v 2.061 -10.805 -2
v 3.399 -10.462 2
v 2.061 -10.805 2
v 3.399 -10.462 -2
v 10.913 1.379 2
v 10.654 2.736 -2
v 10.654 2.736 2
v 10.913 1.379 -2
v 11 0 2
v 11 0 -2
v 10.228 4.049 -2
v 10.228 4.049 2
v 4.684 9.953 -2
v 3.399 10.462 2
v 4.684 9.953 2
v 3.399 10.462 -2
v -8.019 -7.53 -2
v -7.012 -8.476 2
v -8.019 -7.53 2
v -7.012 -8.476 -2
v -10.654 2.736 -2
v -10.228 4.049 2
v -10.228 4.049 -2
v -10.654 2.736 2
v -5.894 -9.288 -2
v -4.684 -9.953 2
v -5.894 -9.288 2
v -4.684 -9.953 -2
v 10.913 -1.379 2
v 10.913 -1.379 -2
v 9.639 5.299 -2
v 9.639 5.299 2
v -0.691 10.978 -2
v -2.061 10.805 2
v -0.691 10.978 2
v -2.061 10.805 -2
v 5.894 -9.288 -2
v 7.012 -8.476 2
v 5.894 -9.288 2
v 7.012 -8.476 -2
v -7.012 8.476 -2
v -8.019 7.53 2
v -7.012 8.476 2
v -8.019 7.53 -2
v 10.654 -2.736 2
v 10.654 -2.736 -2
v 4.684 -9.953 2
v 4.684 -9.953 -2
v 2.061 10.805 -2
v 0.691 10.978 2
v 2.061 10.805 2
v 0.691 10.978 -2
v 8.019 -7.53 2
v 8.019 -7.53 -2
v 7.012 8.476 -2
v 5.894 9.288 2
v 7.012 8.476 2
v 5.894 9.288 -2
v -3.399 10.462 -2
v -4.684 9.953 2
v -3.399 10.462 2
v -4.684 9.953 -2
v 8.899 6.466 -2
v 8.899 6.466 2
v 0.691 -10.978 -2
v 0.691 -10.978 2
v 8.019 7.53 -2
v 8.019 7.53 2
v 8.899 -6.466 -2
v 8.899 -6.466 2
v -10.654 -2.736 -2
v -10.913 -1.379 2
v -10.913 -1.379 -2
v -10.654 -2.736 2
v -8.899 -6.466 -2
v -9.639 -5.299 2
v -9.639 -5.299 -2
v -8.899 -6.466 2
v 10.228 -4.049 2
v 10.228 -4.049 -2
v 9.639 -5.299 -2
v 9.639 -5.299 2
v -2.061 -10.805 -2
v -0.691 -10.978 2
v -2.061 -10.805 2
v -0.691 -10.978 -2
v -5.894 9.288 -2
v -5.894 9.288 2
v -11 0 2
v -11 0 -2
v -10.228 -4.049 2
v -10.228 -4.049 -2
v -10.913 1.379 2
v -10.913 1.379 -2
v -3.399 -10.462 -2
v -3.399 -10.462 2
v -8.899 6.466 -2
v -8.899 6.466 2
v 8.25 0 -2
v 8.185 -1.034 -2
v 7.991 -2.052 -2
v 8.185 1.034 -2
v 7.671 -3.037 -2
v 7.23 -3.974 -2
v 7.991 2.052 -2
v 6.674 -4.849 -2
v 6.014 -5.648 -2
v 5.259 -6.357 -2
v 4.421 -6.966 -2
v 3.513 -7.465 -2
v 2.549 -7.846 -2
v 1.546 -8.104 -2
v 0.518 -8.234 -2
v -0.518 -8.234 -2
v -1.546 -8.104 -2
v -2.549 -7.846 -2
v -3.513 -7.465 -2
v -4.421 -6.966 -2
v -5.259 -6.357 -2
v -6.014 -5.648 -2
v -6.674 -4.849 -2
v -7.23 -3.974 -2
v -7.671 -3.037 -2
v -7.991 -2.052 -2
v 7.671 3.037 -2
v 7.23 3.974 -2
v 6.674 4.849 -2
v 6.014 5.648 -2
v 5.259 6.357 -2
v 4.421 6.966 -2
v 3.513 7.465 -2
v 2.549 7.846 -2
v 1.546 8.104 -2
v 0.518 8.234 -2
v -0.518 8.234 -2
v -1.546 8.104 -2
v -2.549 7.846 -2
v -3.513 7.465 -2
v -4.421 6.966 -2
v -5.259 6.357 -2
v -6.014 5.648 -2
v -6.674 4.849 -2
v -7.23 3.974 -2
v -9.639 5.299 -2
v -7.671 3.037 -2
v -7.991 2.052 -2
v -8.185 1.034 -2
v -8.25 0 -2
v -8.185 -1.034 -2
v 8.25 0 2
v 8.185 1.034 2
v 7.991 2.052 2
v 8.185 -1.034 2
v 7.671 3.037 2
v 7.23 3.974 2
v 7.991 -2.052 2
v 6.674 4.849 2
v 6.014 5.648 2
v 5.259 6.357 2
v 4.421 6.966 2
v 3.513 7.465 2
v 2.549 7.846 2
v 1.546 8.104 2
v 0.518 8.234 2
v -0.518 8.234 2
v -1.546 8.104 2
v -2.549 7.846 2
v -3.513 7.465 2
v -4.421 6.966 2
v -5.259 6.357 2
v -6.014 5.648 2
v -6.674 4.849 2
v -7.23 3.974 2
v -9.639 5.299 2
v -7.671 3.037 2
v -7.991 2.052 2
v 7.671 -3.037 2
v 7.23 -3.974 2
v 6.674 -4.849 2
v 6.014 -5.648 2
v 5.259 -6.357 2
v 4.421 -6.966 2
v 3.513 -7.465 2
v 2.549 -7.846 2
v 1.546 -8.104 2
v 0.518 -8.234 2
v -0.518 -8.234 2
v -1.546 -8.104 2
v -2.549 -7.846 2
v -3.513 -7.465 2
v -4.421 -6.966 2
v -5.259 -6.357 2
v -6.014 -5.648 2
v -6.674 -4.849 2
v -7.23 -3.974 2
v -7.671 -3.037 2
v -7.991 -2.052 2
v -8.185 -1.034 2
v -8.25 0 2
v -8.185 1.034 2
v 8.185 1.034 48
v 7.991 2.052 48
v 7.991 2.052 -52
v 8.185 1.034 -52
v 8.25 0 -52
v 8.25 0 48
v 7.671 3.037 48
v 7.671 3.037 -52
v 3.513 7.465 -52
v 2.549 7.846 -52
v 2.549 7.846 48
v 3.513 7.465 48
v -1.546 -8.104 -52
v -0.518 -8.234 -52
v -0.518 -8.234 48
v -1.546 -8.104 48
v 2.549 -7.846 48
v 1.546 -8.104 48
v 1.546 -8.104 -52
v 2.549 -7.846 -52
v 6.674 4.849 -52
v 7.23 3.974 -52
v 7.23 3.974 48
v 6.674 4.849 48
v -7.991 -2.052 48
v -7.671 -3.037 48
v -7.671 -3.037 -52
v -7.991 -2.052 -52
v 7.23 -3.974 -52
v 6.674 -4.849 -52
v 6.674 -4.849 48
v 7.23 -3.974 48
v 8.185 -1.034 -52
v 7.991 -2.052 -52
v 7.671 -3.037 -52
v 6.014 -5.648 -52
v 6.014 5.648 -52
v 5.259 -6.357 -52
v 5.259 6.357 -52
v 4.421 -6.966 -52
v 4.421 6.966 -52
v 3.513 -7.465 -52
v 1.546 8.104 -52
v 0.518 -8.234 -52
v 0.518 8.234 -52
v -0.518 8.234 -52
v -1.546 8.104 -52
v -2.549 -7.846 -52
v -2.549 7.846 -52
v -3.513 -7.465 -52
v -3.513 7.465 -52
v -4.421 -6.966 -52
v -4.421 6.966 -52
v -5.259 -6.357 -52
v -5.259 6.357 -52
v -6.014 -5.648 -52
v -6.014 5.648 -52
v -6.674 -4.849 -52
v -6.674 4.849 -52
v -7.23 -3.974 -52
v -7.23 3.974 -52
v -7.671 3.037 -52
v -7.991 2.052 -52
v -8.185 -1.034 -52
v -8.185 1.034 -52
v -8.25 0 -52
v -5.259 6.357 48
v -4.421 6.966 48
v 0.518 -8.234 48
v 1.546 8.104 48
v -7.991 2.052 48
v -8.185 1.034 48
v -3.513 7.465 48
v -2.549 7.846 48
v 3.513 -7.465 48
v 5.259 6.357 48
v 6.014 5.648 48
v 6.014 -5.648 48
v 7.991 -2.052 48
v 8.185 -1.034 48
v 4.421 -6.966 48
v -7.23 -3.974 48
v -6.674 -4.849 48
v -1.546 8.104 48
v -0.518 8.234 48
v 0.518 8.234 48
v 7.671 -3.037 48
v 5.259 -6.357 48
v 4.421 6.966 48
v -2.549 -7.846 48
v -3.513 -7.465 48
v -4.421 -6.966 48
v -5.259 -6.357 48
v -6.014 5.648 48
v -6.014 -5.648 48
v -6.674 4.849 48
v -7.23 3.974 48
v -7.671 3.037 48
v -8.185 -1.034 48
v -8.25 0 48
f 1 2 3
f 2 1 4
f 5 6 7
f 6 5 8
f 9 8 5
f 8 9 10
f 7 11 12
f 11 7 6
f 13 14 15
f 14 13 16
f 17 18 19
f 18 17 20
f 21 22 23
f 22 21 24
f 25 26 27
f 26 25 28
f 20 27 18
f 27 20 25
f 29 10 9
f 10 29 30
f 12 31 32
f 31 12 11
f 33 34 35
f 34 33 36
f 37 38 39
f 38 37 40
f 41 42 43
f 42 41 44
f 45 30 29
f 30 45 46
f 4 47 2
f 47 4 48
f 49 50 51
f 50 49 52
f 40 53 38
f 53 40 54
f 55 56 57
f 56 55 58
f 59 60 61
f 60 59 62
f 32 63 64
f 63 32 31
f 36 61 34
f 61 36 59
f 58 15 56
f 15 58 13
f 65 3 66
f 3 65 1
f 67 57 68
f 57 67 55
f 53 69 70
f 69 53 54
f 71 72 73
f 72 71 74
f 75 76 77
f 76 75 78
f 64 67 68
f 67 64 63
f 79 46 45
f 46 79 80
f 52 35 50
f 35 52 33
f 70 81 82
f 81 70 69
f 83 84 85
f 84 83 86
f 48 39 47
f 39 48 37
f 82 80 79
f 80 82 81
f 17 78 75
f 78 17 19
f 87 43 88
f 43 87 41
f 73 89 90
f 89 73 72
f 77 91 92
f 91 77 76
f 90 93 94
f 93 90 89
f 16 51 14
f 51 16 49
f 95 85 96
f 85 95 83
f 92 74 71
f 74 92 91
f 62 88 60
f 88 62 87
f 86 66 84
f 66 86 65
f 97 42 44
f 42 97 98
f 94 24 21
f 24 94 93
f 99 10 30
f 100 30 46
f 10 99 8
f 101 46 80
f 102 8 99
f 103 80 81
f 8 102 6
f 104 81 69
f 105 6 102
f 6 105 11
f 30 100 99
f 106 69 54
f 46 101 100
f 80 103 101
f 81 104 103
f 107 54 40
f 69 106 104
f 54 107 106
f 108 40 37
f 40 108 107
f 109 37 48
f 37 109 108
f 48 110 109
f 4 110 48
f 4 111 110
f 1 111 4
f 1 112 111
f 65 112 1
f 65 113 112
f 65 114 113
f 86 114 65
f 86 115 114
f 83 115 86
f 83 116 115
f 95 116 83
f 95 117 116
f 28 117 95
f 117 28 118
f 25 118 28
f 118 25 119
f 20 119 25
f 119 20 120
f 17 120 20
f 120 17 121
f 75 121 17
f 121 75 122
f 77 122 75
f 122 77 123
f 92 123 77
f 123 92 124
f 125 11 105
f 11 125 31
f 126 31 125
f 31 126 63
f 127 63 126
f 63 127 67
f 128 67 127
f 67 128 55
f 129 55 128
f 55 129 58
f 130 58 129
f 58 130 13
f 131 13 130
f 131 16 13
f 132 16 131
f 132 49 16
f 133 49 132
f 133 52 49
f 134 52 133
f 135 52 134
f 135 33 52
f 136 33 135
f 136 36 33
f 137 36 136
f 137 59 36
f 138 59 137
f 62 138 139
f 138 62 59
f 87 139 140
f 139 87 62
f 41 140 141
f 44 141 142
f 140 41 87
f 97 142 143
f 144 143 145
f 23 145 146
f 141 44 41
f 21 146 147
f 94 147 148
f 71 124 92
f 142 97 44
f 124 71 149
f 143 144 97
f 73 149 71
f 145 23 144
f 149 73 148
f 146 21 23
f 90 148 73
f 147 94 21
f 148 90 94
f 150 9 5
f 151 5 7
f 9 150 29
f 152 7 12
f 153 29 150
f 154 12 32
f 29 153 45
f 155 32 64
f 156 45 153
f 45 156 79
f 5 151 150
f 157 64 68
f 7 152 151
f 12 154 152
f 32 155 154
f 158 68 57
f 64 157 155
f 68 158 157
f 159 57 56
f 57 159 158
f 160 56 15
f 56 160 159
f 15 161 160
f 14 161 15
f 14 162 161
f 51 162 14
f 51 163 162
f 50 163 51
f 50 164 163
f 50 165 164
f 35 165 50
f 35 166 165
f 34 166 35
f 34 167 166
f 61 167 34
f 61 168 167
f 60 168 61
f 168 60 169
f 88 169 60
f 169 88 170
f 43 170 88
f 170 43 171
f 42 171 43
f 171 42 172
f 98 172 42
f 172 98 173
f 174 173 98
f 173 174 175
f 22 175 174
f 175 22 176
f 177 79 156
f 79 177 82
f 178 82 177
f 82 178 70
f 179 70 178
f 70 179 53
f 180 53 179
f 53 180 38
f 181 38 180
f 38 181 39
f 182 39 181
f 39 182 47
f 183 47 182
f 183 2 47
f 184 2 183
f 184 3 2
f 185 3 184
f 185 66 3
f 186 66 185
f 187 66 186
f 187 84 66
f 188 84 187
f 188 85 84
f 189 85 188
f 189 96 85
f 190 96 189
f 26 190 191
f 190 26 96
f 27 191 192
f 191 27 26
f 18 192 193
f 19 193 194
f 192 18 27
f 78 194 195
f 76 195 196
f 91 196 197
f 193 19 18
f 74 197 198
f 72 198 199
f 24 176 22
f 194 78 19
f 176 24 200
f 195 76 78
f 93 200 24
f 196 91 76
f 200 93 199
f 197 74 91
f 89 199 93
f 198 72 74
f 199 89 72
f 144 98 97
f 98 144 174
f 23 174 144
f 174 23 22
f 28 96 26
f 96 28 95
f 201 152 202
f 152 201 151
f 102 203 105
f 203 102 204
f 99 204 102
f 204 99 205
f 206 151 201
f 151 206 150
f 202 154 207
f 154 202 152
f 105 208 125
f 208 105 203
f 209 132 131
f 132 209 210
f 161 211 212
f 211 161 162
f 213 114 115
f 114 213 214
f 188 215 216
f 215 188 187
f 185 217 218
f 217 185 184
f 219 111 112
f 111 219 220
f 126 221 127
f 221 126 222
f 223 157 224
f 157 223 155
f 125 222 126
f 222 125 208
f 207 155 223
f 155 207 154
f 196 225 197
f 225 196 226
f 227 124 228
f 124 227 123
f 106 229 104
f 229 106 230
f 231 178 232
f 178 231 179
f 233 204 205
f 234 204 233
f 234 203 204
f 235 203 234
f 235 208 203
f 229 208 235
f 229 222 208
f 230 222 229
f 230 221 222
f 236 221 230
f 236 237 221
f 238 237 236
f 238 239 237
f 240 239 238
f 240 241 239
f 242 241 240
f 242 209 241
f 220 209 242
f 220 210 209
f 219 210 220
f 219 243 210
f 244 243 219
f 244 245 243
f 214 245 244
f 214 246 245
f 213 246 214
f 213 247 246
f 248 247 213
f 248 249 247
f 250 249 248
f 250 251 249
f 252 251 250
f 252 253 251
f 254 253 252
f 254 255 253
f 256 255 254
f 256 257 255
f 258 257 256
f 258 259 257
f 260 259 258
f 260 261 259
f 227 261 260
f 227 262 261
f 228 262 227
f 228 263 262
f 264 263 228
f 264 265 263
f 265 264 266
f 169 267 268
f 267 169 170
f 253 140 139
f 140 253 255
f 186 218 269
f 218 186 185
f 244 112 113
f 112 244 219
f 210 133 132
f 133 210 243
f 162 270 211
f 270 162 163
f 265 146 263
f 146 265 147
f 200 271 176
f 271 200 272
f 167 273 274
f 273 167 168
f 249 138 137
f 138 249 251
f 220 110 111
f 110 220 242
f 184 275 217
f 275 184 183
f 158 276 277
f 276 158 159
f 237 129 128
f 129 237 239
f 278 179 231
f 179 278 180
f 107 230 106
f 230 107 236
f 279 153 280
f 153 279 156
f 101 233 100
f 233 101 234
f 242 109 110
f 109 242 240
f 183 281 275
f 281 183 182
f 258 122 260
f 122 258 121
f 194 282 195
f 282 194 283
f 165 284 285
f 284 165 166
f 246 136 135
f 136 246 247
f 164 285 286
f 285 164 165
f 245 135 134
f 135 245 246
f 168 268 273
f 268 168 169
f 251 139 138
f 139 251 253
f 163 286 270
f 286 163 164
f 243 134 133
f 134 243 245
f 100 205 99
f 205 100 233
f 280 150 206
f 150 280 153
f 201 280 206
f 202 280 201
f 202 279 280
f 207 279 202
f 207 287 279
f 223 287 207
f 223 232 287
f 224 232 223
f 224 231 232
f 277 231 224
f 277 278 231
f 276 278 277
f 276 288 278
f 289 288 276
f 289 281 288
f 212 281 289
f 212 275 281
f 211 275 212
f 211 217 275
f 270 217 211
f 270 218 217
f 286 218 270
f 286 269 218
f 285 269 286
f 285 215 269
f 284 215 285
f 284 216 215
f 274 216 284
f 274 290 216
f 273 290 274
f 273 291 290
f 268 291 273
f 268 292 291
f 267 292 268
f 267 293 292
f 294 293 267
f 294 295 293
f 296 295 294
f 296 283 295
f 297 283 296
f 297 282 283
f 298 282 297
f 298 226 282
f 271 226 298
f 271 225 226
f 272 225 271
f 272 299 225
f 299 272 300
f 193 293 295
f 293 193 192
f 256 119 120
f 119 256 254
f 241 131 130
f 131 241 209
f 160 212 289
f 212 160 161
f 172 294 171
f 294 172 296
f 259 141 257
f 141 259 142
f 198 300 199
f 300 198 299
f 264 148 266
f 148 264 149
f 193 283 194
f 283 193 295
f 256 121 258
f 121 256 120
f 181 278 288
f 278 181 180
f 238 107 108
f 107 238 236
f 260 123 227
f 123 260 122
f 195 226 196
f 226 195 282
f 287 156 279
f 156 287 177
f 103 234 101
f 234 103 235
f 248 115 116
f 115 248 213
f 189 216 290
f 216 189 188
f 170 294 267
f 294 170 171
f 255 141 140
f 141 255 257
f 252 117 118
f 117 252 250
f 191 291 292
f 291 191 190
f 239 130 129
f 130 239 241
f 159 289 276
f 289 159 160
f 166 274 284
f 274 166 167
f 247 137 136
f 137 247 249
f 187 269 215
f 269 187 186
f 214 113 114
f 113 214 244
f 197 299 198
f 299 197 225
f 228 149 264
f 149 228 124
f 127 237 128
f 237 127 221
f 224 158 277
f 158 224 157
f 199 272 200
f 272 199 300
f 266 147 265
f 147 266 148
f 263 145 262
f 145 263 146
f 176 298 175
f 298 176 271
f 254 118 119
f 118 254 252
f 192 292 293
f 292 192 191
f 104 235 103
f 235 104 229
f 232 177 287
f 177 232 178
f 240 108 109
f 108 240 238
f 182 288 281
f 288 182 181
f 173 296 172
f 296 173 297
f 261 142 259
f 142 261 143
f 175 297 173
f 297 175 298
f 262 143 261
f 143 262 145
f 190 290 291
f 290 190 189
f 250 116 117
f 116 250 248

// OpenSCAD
$fn = 50;

difference() {
	union() {
		translate(v = [0, 0, -2.0]) {
			union() {
				difference() {
					cylinder(h = 4, r = 11);
					cylinder(h = 4, r = 4);
				}
				difference() {
					translate(v = [0, 0, -50]) {
						cylinder(h = 100, r = 8.25);
					}
				}
			}
		}
	}
	union();
}
